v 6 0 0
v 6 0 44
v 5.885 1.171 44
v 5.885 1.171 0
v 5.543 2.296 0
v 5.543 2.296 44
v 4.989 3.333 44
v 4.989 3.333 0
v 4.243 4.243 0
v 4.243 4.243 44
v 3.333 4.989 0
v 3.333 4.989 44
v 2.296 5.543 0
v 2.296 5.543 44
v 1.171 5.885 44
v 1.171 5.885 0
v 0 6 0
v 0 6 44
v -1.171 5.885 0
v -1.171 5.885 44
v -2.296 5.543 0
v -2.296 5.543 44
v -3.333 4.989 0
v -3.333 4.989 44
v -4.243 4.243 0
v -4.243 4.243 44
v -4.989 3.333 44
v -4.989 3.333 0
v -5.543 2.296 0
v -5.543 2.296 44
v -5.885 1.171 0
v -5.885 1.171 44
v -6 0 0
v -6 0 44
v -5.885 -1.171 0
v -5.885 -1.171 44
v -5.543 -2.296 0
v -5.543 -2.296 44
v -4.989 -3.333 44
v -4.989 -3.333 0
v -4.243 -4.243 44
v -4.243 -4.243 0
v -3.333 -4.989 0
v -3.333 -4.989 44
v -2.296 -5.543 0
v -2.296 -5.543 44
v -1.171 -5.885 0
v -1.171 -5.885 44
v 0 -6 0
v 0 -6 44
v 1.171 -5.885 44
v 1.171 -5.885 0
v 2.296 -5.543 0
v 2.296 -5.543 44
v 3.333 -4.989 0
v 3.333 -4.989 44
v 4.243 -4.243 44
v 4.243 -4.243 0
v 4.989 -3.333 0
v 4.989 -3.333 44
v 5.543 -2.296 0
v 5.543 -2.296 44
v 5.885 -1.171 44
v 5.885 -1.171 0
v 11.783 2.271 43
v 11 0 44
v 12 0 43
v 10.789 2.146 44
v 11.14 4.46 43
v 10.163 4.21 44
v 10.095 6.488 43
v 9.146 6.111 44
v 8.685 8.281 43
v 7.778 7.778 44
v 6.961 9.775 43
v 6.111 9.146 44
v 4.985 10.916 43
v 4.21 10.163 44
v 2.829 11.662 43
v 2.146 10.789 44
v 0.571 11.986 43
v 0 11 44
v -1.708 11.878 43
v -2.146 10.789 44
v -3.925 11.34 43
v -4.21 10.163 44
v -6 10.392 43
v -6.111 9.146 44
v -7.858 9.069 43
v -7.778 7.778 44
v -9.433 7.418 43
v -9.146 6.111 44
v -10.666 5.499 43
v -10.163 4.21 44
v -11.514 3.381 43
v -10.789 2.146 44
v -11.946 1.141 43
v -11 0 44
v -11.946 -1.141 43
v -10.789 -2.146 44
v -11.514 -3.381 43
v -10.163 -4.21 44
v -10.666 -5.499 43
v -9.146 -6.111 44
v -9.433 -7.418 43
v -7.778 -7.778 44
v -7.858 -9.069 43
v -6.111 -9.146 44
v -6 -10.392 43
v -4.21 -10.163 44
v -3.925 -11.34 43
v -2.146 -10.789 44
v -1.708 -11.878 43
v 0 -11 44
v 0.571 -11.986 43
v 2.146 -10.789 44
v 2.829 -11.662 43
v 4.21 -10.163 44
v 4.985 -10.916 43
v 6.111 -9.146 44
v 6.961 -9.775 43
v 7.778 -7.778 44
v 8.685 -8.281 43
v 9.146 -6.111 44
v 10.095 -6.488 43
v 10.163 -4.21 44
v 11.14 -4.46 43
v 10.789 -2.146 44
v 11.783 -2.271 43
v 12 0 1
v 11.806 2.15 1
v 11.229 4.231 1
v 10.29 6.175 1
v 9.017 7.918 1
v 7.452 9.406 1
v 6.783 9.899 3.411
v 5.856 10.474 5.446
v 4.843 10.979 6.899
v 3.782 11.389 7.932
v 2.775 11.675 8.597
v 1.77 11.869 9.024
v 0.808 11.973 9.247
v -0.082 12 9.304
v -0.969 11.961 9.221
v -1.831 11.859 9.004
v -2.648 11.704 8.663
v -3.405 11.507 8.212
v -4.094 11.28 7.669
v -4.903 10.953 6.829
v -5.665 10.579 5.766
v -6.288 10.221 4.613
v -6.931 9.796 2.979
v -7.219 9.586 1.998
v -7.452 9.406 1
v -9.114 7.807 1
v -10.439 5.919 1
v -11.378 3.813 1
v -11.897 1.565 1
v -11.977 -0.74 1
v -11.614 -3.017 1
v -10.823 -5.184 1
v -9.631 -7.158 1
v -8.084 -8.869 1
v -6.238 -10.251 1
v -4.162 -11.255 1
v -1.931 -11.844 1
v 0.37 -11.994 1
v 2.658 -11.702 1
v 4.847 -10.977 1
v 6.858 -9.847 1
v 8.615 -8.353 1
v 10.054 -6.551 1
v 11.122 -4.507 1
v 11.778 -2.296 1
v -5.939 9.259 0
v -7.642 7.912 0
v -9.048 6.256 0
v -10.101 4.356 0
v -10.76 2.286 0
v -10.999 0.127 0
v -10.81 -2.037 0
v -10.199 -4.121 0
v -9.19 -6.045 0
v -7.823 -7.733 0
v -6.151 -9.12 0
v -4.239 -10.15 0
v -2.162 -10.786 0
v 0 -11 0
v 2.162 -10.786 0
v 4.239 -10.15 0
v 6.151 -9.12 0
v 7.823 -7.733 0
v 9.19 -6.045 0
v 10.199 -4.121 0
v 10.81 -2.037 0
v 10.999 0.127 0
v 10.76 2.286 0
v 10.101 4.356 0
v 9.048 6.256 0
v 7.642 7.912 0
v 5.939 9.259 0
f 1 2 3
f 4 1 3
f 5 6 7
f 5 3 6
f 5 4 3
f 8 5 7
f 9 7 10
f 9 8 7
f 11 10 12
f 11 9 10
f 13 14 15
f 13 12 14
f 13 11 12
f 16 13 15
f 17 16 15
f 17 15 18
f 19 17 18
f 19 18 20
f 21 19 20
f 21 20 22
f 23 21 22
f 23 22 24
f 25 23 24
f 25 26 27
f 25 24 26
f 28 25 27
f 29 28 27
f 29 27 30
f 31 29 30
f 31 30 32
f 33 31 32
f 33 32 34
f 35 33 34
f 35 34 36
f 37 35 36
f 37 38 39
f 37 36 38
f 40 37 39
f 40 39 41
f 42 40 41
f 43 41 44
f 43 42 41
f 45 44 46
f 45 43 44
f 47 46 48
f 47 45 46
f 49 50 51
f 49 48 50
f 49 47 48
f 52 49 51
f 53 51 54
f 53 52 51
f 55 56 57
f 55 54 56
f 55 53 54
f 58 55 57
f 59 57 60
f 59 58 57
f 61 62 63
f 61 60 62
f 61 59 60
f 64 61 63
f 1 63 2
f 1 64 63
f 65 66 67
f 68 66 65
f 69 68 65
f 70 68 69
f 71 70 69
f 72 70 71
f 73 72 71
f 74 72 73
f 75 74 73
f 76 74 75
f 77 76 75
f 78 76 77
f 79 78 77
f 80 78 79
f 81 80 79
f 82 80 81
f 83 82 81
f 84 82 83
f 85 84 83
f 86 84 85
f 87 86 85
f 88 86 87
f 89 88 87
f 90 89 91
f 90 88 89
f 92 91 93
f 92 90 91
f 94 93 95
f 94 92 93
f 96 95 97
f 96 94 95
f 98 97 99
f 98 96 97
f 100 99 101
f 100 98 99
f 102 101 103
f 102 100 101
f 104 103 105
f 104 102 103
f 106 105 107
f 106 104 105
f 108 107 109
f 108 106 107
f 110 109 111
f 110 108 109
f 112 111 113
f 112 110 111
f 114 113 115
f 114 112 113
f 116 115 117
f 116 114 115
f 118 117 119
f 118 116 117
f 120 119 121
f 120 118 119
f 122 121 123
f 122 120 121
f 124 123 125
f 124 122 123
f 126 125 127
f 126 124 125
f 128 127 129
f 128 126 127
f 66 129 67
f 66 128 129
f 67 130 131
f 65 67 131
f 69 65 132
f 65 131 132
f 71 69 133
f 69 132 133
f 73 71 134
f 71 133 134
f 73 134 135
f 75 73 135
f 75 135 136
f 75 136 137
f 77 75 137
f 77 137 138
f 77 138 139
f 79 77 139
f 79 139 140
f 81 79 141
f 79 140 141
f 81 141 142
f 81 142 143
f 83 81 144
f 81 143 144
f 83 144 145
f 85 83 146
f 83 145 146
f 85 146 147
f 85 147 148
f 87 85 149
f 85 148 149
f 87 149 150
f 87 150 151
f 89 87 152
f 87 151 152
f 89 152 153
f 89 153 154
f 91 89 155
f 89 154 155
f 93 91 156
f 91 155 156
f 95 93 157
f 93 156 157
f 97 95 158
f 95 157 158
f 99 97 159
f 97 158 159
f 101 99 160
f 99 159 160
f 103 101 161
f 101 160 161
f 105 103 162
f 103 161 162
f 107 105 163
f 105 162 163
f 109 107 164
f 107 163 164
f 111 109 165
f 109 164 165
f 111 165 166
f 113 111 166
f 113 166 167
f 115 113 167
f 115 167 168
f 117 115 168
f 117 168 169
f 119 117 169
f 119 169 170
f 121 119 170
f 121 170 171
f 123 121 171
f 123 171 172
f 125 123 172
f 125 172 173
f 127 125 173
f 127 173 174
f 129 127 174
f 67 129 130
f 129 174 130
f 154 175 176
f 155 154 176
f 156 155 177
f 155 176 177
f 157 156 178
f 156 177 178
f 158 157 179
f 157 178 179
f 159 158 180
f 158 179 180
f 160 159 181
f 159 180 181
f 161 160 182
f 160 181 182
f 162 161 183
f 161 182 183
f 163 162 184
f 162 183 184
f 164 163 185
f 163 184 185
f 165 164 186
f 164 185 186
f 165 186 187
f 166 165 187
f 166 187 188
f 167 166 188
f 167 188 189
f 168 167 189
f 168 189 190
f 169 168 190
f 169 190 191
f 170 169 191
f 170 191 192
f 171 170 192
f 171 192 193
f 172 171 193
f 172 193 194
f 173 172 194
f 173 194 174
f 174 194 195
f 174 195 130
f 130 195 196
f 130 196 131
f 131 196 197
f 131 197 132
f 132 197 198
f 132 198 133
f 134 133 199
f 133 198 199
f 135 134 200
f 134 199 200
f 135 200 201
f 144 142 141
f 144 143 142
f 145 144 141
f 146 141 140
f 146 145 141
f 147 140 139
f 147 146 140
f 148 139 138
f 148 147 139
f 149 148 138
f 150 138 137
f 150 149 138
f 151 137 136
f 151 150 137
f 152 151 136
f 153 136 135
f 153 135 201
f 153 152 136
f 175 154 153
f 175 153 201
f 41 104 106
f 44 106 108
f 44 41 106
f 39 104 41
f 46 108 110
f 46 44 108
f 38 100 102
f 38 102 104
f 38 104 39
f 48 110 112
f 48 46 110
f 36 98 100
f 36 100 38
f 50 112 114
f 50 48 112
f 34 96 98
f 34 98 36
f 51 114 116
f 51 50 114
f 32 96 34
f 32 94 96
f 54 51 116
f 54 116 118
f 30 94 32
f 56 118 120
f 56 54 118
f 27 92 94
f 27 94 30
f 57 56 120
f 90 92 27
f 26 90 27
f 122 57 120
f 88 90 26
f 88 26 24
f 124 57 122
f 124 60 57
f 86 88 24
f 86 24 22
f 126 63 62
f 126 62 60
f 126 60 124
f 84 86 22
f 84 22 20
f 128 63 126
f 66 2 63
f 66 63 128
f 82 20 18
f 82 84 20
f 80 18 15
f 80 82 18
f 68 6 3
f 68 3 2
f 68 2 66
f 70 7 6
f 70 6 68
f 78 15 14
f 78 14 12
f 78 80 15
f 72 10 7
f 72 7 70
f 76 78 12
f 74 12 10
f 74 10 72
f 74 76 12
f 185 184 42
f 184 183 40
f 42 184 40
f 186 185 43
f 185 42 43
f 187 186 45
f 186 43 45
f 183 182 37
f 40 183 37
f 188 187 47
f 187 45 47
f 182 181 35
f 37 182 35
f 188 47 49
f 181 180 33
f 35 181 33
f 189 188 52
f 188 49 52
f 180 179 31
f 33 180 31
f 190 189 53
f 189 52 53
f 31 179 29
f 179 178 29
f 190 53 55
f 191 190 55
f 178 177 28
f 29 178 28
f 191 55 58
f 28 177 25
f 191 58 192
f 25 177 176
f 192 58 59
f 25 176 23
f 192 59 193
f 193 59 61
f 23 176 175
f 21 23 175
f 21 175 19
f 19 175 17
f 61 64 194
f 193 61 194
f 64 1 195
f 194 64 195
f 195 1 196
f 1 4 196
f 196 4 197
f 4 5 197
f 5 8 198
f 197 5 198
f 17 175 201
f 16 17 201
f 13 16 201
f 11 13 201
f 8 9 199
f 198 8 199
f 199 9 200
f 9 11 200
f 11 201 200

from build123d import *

# Parameters (mm, degrees)
SKETCH_1_R               = 12
EXTRUDE_1_DEPTH          = 44
CUT_EXTRUDE_1_DEPTH      = 48.15930449
CUT_EXTRUDE_1_DEPTH_BACK = 48.15930449
SKETCH_2_R               = 6
CHAMFER_1_SIZE           = 1
CUT_EXTRUDE_2_DEPTH      = 48.15930449
CUT_EXTRUDE_2_DEPTH_BACK = 48.15930449


with BuildPart() as part:
    # 草图1 → 凸台-拉伸1 (new body)
    with BuildSketch(Plane.XY):
        Circle(SKETCH_1_R)
    extrude(amount=EXTRUDE_1_DEPTH)

    # 草图2 → 切除-拉伸1 (cut, two sides: drawn at the far end of the back side and taken through both)
    with BuildSketch(Plane.XY.offset(44).offset(-CUT_EXTRUDE_1_DEPTH_BACK)):
        Circle(SKETCH_2_R)
    extrude(amount=CUT_EXTRUDE_1_DEPTH + CUT_EXTRUDE_1_DEPTH_BACK, mode=Mode.SUBTRACT)

    # 倒角1
    chamfer_1_edges = [part.edges().sort_by_distance(p)[0] for p in [
        (-12, 0, 0),
        (-12, 0, 44),
    ]]
    chamfer(chamfer_1_edges, length=CHAMFER_1_SIZE)

    # 草图3 → 切除-拉伸2 (cut, two sides: drawn at the far end of the back side and taken through both)
    with BuildSketch(Plane(origin=(0, 0, 0), x_dir=(0, 0, -1), z_dir=(1, 0, 0)).offset(-CUT_EXTRUDE_2_DEPTH_BACK)):
        with BuildLine():
            Line((-62.986172875, 133.10063067), (-25.120459682, 29.369909319))
            ThreePointArc((-25.120459682, 29.369909319), (-14.752953683, 15.315455683), (1.566572924, 9.095656735))
            Line((1.566572924, 9.095656735), (111.651710823, 0.427484986))
            Line((111.651710823, 0.427484986), (245.252446132, 176.286356459))
            Line((245.252446132, 176.286356459), (70.614562433, 308.959502143))
            Line((70.614562433, 308.959502143), (-62.986172875, 133.10063067))
        make_face()
    extrude(amount=CUT_EXTRUDE_2_DEPTH + CUT_EXTRUDE_2_DEPTH_BACK, mode=Mode.SUBTRACT)


solid = part.part
